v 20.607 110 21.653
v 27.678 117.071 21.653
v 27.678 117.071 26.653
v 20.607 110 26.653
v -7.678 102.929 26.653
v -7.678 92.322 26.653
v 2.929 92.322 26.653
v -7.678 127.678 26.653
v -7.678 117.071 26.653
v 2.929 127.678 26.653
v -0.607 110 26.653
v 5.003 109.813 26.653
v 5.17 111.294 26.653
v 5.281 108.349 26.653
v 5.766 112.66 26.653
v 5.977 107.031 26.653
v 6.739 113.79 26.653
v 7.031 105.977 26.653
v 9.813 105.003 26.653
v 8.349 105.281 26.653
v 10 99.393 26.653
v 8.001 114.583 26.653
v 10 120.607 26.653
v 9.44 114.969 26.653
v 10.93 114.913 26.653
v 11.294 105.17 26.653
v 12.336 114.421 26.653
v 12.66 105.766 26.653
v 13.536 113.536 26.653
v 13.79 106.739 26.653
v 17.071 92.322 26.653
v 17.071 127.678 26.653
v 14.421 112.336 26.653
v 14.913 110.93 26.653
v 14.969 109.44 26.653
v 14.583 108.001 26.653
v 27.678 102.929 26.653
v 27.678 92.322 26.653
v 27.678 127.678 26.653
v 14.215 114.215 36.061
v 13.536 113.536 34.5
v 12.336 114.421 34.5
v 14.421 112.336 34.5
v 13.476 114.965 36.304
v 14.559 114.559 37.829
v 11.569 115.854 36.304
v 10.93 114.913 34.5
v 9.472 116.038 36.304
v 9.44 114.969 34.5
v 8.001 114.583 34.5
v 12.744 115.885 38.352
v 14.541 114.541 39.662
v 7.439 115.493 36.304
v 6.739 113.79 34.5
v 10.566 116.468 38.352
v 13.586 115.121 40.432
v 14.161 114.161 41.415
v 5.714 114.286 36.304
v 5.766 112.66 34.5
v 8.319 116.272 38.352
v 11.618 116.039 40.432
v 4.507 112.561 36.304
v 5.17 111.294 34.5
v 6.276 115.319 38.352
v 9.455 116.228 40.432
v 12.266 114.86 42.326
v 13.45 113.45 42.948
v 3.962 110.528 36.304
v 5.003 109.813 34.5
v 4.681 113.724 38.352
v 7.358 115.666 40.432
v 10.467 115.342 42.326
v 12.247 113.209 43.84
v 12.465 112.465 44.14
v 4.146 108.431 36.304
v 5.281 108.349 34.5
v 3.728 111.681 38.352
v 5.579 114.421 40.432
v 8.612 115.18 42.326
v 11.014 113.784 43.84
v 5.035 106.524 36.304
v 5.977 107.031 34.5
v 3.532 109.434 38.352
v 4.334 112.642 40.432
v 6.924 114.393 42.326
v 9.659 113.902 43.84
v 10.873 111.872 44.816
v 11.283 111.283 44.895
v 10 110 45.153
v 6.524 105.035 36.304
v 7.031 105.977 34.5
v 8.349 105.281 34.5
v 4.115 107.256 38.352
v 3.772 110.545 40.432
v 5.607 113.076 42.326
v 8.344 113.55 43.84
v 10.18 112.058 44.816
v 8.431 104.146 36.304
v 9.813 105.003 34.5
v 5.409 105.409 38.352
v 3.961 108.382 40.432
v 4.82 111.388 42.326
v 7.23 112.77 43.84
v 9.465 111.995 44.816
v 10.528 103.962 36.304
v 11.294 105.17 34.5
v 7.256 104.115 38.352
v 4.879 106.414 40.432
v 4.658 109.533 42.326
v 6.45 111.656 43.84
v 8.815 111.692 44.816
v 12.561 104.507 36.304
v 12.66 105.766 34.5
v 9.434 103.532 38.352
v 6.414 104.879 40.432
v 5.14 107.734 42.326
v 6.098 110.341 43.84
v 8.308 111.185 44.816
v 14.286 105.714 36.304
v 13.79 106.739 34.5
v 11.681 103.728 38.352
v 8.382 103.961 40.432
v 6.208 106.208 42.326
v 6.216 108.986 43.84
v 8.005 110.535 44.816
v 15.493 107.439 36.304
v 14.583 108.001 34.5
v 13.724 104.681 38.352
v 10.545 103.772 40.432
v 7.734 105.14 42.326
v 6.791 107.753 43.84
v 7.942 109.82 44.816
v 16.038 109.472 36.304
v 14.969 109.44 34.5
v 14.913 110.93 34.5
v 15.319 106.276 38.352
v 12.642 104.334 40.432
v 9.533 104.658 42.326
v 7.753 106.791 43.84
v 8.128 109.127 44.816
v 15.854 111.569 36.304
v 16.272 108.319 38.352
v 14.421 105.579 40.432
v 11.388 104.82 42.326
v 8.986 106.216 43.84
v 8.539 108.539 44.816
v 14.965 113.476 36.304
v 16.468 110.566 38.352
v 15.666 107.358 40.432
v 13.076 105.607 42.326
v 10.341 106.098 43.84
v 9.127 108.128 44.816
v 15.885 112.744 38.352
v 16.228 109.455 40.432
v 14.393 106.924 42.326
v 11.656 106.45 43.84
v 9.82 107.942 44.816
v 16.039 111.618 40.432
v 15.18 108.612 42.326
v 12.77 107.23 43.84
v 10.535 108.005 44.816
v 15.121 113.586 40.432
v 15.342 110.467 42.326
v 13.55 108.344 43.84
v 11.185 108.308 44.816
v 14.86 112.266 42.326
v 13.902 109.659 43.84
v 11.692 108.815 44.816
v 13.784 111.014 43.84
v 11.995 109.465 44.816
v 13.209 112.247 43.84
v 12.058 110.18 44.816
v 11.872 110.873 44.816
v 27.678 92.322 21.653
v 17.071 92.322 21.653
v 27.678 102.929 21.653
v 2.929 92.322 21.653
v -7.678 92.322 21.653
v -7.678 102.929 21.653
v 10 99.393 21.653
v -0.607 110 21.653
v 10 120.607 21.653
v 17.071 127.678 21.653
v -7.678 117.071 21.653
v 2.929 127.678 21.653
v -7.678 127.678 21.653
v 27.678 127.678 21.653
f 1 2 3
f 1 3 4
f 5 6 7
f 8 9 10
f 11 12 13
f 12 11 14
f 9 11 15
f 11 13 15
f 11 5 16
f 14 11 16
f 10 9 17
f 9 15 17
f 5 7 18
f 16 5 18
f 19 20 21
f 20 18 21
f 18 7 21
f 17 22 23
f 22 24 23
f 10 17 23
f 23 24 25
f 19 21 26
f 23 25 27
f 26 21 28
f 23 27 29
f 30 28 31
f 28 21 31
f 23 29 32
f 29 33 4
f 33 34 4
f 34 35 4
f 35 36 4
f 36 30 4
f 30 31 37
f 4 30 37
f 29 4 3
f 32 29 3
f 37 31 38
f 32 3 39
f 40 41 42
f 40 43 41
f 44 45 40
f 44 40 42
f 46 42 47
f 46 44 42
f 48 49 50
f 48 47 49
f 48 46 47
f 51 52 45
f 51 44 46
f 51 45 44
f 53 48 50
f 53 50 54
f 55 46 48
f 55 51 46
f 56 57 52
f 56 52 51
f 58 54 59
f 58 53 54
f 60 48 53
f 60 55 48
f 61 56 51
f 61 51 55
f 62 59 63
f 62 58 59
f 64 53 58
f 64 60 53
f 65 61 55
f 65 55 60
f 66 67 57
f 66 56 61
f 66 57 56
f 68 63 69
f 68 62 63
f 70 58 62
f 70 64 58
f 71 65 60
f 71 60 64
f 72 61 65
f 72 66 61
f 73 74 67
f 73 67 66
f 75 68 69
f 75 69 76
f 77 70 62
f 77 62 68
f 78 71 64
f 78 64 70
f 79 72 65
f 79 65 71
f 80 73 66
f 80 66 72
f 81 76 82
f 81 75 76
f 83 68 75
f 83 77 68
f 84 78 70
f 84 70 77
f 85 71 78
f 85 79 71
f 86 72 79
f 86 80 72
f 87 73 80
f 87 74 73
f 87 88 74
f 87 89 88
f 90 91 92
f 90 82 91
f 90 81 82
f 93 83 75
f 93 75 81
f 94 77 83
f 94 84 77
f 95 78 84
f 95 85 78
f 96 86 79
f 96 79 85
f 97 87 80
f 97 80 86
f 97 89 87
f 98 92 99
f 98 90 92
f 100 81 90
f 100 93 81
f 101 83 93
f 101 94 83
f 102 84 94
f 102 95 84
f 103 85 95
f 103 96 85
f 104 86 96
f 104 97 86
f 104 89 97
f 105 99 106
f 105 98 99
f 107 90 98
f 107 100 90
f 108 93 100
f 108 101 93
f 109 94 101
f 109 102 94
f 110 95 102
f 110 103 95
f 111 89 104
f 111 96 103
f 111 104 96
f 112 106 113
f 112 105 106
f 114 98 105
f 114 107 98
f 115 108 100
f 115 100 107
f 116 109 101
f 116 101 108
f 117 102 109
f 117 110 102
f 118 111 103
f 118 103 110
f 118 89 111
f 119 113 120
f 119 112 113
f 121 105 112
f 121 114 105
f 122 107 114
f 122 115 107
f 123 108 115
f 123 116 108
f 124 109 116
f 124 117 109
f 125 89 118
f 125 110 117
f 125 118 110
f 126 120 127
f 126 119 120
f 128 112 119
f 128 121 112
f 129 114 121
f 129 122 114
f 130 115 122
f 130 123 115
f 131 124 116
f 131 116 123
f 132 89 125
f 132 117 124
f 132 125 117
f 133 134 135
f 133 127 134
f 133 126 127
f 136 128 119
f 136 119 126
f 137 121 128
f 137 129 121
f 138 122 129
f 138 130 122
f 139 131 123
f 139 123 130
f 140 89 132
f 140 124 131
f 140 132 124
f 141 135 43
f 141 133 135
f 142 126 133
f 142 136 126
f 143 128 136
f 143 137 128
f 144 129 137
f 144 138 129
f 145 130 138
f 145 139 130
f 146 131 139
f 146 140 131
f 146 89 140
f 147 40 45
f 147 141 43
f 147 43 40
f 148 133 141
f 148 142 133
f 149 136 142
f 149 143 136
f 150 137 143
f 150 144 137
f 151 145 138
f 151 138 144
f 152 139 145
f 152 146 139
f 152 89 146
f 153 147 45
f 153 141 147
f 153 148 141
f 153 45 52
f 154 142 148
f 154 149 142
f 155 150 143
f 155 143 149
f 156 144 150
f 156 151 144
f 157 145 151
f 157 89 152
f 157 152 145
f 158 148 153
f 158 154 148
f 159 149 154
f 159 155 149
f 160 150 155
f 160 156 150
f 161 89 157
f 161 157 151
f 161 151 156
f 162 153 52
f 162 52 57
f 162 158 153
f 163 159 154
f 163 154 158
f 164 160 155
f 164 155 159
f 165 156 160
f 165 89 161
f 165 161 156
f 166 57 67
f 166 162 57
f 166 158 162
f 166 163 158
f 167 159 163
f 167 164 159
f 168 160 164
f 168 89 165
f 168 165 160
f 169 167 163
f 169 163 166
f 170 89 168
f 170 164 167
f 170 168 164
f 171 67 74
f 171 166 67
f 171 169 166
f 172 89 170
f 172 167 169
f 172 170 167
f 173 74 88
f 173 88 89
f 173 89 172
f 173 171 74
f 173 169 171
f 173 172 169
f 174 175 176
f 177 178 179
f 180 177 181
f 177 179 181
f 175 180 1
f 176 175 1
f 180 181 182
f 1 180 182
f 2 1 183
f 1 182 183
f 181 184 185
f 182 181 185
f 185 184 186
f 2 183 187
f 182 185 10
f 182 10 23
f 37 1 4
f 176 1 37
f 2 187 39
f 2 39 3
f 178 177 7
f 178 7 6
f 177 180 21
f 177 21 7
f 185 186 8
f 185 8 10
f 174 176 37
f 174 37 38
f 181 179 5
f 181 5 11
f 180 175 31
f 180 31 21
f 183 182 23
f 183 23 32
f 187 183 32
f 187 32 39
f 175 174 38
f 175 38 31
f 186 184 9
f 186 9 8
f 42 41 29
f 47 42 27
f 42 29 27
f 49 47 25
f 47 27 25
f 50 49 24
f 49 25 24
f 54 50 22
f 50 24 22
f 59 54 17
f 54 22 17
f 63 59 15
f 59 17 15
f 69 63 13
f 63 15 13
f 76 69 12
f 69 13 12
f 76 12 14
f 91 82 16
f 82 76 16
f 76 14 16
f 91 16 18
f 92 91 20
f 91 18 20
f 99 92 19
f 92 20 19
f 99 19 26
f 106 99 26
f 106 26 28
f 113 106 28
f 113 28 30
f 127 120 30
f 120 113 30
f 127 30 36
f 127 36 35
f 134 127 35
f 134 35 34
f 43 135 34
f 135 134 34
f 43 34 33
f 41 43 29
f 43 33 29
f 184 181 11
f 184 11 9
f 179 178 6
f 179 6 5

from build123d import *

# Parameters (mm, degrees)
CYLINDER011_R            = 5
CYLINDER011_DEPTH        = 15
PAD_DEPTH                = 5
ARRAY006_COUNT           = 4
CLONE017_PLACEMENT_ANGLE = 45


with BuildPart() as cylinder011:
    # Cylinder011 → Cylinder011 (new body)
    with BuildSketch(Plane.XY):
        Circle(CYLINDER011_R)
    extrude(amount=CYLINDER011_DEPTH)


with BuildPart() as sphere:
    # Sphere → Sphere (revolve)
    with BuildSketch(Plane(origin=(0, 0, 17), x_dir=(1, 0, 0), z_dir=(0, -1, 0))):
        with BuildLine():
            ThreePointArc((0, -6.5), (6.5, 0), (0, 6.5))
            Line((0, 6.5), (0, -6.5))
        make_face()
    revolve(axis=Axis((0, 0, 17), (0, 0, 1)))


with BuildPart() as clone_of_piezacruz:
    # Sketch → Pad (new body)
    with BuildSketch(Plane.XY):
        Polygon((0, 7.5), (17.5, 7.5), (25, 0), (17.5, -7.5), (0, -7.5), align=None)
    extrude(amount=PAD_DEPTH)

    # Array006: Clone of piezaCruz ×4 about axis
    array006_axis = Axis((0, 0, 0), (0, 0, 1))


with BuildPart() as clone_of_piezacruz_1:
    add(clone_of_piezacruz.part)
    for i in range(1, ARRAY006_COUNT):
        add(clone_of_piezacruz.part.rotate(array006_axis, i * 360 / ARRAY006_COUNT))

    # Fusion017: union Cylinder011, Sphere
    add(cylinder011.part)
    add(sphere.part)


with BuildPart() as clone_of_piezacruz_2:
    # Clone017 placement: moved
    add(clone_of_piezacruz_1.part.moved(Location((10, 110, 21.6533))).rotate(Axis((10, 110, 21.6533), (0, 0, 1)), CLONE017_PLACEMENT_ANGLE))


solid = clone_of_piezacruz_2.part
